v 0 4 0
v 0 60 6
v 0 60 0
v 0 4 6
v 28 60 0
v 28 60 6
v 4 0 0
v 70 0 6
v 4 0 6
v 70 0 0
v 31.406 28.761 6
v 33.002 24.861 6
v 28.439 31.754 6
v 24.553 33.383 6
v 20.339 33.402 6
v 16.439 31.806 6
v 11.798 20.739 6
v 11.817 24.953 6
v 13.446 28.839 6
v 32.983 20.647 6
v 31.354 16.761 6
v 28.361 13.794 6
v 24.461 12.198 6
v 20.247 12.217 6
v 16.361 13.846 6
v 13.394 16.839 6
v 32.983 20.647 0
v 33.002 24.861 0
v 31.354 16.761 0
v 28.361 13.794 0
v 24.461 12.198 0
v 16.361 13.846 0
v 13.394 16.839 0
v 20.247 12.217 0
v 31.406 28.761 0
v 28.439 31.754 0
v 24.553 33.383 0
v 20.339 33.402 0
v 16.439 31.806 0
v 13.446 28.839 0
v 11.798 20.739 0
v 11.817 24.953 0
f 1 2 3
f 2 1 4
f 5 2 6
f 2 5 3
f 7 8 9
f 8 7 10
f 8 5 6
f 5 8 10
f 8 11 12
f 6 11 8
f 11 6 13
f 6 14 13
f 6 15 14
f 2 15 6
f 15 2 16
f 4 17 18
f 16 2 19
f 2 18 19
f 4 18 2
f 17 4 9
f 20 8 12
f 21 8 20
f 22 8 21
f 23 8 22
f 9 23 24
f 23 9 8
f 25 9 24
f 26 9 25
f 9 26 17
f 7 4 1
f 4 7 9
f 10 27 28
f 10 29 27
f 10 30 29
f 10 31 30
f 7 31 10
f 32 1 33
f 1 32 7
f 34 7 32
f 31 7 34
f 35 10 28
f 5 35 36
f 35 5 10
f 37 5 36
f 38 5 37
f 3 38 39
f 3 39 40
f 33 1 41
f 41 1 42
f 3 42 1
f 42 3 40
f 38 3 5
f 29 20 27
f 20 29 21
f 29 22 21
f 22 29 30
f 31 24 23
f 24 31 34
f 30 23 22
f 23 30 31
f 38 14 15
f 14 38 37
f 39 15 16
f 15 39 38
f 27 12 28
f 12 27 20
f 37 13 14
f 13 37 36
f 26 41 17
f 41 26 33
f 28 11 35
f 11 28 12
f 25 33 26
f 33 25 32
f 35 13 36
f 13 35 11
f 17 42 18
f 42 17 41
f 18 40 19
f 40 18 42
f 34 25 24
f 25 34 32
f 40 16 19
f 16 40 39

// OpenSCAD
$fn = 32;

// ----------------------------------------------------------------------
// Bracket plate: gusset 70 x 60
// ----------------------------------------------------------------------

// --- parameters (mm) ---
hole_r = 4;               // bolt hole radius
plate_t = 6;              // plate thickness, Z (extrusion height)
gus_a = 70;               // base length
gus_b = 60;               // height
top_x = 28;               // top edge X of the angled cut
light_r = 10.8;           // lightening hole radius

light_d = 2 * light_r;

profile = [[4, 0], [35, 0], [70, 0], [28, 60], [0, 60], [0, 4]];  // primary outline, 6 points, counter clockwise
void_1 = [[33.002, 24.861], [31.406, 28.761], [28.439, 31.754], [24.553, 33.383], [20.339, 33.402], [16.439, 31.806], [13.446, 28.839], [11.817, 24.953], [11.798, 20.739], [13.394, 16.839], [16.361, 13.846], [20.247, 12.217], [24.461, 12.198], [28.361, 13.794], [31.354, 16.761], [32.983, 20.647]];  // lightening hole, 16 points

// --- the one profile operation ---
difference() {
  linear_extrude(height = plate_t) polygon(points = profile);
  translate([0, 0, -1])
    linear_extrude(height = plate_t + 2) polygon(points = void_1);
}
